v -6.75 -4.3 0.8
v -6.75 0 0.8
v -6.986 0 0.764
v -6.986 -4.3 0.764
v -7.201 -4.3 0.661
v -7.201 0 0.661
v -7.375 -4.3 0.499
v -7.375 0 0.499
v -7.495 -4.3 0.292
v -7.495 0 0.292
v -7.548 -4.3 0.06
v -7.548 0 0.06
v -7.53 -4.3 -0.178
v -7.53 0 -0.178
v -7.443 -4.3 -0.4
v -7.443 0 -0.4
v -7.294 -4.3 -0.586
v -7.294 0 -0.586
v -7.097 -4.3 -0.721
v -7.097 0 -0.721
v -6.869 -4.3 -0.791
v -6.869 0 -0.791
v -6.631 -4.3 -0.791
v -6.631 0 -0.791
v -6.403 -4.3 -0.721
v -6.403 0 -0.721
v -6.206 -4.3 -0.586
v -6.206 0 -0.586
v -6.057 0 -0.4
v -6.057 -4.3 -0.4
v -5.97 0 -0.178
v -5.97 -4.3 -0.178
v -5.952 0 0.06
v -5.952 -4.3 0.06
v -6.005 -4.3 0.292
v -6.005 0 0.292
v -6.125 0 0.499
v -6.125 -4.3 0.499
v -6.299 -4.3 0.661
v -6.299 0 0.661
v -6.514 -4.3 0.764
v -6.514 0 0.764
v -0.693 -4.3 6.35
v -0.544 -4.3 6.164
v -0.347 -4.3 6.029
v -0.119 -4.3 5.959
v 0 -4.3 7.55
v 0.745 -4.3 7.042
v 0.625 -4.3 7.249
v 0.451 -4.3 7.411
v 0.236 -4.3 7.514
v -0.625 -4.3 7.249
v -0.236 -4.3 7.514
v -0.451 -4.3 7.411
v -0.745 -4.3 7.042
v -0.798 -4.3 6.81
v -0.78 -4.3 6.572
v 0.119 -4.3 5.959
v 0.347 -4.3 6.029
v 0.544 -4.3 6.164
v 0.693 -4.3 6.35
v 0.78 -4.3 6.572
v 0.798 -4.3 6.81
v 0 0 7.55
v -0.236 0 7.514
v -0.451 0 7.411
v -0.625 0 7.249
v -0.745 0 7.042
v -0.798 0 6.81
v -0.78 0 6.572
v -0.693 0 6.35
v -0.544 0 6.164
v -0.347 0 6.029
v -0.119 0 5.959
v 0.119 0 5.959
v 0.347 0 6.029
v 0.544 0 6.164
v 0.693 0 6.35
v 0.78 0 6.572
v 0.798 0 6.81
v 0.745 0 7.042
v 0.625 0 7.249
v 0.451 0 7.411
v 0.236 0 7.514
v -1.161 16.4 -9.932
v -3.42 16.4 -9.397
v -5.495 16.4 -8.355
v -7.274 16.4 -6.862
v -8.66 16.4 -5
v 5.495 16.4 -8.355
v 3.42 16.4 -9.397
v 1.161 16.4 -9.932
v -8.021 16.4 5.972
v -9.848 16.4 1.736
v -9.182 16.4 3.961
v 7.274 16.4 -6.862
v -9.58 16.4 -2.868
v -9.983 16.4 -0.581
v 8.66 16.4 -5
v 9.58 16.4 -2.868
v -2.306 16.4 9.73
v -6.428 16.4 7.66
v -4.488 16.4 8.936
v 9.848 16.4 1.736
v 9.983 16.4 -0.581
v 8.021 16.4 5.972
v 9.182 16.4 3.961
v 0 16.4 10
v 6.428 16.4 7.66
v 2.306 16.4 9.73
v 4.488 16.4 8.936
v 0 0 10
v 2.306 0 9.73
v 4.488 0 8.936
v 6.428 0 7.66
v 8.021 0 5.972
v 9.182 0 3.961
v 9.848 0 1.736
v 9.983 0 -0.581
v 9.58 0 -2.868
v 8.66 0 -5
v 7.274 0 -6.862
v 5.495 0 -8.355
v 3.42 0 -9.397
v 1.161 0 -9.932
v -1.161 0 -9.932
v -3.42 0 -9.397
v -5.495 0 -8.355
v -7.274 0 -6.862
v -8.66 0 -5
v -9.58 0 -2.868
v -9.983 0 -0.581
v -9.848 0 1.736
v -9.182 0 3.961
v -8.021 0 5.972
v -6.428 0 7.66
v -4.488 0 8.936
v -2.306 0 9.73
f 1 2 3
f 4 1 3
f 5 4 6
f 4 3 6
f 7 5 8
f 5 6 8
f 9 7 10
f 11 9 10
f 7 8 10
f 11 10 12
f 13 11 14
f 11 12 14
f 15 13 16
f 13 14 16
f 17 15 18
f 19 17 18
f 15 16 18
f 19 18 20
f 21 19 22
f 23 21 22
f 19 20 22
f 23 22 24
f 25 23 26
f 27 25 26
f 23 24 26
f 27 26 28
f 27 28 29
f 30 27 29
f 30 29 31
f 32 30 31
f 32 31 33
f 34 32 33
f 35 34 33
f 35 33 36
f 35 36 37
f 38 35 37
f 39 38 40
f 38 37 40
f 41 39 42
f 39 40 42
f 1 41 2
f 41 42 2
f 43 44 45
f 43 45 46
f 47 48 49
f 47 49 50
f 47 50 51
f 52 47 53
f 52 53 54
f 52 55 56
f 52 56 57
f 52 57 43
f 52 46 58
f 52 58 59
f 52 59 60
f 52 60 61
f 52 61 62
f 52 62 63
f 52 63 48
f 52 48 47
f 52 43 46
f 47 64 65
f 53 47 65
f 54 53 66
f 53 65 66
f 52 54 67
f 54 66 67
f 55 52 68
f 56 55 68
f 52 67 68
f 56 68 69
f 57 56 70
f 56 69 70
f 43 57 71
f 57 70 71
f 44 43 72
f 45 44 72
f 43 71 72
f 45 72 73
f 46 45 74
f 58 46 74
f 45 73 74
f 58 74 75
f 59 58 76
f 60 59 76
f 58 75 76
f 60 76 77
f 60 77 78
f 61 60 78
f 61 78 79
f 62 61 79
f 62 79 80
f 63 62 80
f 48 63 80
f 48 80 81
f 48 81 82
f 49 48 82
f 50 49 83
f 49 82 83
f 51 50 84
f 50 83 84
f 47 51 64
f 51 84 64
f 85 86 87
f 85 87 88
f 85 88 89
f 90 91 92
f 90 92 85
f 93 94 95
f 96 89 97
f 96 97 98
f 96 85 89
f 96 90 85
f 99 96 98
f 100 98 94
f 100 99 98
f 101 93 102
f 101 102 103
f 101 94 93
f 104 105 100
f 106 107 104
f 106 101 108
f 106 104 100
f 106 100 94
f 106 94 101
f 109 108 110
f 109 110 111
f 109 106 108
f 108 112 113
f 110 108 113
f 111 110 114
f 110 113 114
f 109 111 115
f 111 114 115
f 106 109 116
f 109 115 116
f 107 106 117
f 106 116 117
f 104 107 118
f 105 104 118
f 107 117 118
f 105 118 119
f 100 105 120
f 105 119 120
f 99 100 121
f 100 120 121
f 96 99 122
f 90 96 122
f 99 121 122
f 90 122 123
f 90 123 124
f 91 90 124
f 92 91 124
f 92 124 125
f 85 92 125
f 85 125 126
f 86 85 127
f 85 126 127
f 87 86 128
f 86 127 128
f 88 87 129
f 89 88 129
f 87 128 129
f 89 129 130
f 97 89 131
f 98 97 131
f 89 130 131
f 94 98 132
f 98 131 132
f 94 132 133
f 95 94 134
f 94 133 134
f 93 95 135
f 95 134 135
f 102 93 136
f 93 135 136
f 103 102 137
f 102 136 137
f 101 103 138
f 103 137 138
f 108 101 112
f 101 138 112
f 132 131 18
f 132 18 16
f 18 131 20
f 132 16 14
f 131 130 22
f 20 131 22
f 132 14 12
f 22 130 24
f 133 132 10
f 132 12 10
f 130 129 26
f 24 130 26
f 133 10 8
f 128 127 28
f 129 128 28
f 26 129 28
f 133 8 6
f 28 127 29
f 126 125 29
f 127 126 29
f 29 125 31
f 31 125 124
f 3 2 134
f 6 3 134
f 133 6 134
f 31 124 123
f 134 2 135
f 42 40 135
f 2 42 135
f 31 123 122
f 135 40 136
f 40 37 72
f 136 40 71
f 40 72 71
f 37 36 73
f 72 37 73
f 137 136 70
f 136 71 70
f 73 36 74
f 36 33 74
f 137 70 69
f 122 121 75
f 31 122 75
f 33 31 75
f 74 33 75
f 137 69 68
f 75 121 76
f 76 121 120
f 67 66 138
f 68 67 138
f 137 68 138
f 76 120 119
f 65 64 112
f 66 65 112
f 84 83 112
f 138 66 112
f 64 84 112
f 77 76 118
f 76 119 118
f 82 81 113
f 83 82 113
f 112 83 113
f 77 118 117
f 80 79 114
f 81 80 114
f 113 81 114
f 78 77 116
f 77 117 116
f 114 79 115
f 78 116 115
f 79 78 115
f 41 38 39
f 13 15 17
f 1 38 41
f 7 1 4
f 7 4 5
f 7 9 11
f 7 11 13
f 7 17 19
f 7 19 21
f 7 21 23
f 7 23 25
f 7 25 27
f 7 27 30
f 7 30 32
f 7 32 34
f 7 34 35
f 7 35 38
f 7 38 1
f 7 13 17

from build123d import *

# Parameters (mm, degrees)
SKETCH_1_R      = 10
EXTRUDE_1_DEPTH = 16.4
SKETCH_2_R      = 0.8
EXTRUDE_2_DEPTH = 4.3


with BuildPart() as part:
    # Эскиз1 → Бобышка-Вытянуть1 (new body)
    with BuildSketch(Plane(origin=(0, 0, 0), x_dir=(1, 0, 0), z_dir=(0, 1, 0))):
        with Locations(Location((0, 0, 0), (0, 0, 270))):
            Circle(SKETCH_1_R)
    extrude(amount=EXTRUDE_1_DEPTH)

    # Эскиз2 → Бобышка-Вытянуть2 (add)
    with BuildSketch(Plane.XZ):
        with Locations(Location((0, 6.75, 0), (0, 0, 90))):
            Circle(SKETCH_2_R)
        with Locations(Location((-6.75, 0, 0), (0, 0, 90))):
            Circle(SKETCH_2_R)
    extrude(amount=EXTRUDE_2_DEPTH)


solid = part.part
